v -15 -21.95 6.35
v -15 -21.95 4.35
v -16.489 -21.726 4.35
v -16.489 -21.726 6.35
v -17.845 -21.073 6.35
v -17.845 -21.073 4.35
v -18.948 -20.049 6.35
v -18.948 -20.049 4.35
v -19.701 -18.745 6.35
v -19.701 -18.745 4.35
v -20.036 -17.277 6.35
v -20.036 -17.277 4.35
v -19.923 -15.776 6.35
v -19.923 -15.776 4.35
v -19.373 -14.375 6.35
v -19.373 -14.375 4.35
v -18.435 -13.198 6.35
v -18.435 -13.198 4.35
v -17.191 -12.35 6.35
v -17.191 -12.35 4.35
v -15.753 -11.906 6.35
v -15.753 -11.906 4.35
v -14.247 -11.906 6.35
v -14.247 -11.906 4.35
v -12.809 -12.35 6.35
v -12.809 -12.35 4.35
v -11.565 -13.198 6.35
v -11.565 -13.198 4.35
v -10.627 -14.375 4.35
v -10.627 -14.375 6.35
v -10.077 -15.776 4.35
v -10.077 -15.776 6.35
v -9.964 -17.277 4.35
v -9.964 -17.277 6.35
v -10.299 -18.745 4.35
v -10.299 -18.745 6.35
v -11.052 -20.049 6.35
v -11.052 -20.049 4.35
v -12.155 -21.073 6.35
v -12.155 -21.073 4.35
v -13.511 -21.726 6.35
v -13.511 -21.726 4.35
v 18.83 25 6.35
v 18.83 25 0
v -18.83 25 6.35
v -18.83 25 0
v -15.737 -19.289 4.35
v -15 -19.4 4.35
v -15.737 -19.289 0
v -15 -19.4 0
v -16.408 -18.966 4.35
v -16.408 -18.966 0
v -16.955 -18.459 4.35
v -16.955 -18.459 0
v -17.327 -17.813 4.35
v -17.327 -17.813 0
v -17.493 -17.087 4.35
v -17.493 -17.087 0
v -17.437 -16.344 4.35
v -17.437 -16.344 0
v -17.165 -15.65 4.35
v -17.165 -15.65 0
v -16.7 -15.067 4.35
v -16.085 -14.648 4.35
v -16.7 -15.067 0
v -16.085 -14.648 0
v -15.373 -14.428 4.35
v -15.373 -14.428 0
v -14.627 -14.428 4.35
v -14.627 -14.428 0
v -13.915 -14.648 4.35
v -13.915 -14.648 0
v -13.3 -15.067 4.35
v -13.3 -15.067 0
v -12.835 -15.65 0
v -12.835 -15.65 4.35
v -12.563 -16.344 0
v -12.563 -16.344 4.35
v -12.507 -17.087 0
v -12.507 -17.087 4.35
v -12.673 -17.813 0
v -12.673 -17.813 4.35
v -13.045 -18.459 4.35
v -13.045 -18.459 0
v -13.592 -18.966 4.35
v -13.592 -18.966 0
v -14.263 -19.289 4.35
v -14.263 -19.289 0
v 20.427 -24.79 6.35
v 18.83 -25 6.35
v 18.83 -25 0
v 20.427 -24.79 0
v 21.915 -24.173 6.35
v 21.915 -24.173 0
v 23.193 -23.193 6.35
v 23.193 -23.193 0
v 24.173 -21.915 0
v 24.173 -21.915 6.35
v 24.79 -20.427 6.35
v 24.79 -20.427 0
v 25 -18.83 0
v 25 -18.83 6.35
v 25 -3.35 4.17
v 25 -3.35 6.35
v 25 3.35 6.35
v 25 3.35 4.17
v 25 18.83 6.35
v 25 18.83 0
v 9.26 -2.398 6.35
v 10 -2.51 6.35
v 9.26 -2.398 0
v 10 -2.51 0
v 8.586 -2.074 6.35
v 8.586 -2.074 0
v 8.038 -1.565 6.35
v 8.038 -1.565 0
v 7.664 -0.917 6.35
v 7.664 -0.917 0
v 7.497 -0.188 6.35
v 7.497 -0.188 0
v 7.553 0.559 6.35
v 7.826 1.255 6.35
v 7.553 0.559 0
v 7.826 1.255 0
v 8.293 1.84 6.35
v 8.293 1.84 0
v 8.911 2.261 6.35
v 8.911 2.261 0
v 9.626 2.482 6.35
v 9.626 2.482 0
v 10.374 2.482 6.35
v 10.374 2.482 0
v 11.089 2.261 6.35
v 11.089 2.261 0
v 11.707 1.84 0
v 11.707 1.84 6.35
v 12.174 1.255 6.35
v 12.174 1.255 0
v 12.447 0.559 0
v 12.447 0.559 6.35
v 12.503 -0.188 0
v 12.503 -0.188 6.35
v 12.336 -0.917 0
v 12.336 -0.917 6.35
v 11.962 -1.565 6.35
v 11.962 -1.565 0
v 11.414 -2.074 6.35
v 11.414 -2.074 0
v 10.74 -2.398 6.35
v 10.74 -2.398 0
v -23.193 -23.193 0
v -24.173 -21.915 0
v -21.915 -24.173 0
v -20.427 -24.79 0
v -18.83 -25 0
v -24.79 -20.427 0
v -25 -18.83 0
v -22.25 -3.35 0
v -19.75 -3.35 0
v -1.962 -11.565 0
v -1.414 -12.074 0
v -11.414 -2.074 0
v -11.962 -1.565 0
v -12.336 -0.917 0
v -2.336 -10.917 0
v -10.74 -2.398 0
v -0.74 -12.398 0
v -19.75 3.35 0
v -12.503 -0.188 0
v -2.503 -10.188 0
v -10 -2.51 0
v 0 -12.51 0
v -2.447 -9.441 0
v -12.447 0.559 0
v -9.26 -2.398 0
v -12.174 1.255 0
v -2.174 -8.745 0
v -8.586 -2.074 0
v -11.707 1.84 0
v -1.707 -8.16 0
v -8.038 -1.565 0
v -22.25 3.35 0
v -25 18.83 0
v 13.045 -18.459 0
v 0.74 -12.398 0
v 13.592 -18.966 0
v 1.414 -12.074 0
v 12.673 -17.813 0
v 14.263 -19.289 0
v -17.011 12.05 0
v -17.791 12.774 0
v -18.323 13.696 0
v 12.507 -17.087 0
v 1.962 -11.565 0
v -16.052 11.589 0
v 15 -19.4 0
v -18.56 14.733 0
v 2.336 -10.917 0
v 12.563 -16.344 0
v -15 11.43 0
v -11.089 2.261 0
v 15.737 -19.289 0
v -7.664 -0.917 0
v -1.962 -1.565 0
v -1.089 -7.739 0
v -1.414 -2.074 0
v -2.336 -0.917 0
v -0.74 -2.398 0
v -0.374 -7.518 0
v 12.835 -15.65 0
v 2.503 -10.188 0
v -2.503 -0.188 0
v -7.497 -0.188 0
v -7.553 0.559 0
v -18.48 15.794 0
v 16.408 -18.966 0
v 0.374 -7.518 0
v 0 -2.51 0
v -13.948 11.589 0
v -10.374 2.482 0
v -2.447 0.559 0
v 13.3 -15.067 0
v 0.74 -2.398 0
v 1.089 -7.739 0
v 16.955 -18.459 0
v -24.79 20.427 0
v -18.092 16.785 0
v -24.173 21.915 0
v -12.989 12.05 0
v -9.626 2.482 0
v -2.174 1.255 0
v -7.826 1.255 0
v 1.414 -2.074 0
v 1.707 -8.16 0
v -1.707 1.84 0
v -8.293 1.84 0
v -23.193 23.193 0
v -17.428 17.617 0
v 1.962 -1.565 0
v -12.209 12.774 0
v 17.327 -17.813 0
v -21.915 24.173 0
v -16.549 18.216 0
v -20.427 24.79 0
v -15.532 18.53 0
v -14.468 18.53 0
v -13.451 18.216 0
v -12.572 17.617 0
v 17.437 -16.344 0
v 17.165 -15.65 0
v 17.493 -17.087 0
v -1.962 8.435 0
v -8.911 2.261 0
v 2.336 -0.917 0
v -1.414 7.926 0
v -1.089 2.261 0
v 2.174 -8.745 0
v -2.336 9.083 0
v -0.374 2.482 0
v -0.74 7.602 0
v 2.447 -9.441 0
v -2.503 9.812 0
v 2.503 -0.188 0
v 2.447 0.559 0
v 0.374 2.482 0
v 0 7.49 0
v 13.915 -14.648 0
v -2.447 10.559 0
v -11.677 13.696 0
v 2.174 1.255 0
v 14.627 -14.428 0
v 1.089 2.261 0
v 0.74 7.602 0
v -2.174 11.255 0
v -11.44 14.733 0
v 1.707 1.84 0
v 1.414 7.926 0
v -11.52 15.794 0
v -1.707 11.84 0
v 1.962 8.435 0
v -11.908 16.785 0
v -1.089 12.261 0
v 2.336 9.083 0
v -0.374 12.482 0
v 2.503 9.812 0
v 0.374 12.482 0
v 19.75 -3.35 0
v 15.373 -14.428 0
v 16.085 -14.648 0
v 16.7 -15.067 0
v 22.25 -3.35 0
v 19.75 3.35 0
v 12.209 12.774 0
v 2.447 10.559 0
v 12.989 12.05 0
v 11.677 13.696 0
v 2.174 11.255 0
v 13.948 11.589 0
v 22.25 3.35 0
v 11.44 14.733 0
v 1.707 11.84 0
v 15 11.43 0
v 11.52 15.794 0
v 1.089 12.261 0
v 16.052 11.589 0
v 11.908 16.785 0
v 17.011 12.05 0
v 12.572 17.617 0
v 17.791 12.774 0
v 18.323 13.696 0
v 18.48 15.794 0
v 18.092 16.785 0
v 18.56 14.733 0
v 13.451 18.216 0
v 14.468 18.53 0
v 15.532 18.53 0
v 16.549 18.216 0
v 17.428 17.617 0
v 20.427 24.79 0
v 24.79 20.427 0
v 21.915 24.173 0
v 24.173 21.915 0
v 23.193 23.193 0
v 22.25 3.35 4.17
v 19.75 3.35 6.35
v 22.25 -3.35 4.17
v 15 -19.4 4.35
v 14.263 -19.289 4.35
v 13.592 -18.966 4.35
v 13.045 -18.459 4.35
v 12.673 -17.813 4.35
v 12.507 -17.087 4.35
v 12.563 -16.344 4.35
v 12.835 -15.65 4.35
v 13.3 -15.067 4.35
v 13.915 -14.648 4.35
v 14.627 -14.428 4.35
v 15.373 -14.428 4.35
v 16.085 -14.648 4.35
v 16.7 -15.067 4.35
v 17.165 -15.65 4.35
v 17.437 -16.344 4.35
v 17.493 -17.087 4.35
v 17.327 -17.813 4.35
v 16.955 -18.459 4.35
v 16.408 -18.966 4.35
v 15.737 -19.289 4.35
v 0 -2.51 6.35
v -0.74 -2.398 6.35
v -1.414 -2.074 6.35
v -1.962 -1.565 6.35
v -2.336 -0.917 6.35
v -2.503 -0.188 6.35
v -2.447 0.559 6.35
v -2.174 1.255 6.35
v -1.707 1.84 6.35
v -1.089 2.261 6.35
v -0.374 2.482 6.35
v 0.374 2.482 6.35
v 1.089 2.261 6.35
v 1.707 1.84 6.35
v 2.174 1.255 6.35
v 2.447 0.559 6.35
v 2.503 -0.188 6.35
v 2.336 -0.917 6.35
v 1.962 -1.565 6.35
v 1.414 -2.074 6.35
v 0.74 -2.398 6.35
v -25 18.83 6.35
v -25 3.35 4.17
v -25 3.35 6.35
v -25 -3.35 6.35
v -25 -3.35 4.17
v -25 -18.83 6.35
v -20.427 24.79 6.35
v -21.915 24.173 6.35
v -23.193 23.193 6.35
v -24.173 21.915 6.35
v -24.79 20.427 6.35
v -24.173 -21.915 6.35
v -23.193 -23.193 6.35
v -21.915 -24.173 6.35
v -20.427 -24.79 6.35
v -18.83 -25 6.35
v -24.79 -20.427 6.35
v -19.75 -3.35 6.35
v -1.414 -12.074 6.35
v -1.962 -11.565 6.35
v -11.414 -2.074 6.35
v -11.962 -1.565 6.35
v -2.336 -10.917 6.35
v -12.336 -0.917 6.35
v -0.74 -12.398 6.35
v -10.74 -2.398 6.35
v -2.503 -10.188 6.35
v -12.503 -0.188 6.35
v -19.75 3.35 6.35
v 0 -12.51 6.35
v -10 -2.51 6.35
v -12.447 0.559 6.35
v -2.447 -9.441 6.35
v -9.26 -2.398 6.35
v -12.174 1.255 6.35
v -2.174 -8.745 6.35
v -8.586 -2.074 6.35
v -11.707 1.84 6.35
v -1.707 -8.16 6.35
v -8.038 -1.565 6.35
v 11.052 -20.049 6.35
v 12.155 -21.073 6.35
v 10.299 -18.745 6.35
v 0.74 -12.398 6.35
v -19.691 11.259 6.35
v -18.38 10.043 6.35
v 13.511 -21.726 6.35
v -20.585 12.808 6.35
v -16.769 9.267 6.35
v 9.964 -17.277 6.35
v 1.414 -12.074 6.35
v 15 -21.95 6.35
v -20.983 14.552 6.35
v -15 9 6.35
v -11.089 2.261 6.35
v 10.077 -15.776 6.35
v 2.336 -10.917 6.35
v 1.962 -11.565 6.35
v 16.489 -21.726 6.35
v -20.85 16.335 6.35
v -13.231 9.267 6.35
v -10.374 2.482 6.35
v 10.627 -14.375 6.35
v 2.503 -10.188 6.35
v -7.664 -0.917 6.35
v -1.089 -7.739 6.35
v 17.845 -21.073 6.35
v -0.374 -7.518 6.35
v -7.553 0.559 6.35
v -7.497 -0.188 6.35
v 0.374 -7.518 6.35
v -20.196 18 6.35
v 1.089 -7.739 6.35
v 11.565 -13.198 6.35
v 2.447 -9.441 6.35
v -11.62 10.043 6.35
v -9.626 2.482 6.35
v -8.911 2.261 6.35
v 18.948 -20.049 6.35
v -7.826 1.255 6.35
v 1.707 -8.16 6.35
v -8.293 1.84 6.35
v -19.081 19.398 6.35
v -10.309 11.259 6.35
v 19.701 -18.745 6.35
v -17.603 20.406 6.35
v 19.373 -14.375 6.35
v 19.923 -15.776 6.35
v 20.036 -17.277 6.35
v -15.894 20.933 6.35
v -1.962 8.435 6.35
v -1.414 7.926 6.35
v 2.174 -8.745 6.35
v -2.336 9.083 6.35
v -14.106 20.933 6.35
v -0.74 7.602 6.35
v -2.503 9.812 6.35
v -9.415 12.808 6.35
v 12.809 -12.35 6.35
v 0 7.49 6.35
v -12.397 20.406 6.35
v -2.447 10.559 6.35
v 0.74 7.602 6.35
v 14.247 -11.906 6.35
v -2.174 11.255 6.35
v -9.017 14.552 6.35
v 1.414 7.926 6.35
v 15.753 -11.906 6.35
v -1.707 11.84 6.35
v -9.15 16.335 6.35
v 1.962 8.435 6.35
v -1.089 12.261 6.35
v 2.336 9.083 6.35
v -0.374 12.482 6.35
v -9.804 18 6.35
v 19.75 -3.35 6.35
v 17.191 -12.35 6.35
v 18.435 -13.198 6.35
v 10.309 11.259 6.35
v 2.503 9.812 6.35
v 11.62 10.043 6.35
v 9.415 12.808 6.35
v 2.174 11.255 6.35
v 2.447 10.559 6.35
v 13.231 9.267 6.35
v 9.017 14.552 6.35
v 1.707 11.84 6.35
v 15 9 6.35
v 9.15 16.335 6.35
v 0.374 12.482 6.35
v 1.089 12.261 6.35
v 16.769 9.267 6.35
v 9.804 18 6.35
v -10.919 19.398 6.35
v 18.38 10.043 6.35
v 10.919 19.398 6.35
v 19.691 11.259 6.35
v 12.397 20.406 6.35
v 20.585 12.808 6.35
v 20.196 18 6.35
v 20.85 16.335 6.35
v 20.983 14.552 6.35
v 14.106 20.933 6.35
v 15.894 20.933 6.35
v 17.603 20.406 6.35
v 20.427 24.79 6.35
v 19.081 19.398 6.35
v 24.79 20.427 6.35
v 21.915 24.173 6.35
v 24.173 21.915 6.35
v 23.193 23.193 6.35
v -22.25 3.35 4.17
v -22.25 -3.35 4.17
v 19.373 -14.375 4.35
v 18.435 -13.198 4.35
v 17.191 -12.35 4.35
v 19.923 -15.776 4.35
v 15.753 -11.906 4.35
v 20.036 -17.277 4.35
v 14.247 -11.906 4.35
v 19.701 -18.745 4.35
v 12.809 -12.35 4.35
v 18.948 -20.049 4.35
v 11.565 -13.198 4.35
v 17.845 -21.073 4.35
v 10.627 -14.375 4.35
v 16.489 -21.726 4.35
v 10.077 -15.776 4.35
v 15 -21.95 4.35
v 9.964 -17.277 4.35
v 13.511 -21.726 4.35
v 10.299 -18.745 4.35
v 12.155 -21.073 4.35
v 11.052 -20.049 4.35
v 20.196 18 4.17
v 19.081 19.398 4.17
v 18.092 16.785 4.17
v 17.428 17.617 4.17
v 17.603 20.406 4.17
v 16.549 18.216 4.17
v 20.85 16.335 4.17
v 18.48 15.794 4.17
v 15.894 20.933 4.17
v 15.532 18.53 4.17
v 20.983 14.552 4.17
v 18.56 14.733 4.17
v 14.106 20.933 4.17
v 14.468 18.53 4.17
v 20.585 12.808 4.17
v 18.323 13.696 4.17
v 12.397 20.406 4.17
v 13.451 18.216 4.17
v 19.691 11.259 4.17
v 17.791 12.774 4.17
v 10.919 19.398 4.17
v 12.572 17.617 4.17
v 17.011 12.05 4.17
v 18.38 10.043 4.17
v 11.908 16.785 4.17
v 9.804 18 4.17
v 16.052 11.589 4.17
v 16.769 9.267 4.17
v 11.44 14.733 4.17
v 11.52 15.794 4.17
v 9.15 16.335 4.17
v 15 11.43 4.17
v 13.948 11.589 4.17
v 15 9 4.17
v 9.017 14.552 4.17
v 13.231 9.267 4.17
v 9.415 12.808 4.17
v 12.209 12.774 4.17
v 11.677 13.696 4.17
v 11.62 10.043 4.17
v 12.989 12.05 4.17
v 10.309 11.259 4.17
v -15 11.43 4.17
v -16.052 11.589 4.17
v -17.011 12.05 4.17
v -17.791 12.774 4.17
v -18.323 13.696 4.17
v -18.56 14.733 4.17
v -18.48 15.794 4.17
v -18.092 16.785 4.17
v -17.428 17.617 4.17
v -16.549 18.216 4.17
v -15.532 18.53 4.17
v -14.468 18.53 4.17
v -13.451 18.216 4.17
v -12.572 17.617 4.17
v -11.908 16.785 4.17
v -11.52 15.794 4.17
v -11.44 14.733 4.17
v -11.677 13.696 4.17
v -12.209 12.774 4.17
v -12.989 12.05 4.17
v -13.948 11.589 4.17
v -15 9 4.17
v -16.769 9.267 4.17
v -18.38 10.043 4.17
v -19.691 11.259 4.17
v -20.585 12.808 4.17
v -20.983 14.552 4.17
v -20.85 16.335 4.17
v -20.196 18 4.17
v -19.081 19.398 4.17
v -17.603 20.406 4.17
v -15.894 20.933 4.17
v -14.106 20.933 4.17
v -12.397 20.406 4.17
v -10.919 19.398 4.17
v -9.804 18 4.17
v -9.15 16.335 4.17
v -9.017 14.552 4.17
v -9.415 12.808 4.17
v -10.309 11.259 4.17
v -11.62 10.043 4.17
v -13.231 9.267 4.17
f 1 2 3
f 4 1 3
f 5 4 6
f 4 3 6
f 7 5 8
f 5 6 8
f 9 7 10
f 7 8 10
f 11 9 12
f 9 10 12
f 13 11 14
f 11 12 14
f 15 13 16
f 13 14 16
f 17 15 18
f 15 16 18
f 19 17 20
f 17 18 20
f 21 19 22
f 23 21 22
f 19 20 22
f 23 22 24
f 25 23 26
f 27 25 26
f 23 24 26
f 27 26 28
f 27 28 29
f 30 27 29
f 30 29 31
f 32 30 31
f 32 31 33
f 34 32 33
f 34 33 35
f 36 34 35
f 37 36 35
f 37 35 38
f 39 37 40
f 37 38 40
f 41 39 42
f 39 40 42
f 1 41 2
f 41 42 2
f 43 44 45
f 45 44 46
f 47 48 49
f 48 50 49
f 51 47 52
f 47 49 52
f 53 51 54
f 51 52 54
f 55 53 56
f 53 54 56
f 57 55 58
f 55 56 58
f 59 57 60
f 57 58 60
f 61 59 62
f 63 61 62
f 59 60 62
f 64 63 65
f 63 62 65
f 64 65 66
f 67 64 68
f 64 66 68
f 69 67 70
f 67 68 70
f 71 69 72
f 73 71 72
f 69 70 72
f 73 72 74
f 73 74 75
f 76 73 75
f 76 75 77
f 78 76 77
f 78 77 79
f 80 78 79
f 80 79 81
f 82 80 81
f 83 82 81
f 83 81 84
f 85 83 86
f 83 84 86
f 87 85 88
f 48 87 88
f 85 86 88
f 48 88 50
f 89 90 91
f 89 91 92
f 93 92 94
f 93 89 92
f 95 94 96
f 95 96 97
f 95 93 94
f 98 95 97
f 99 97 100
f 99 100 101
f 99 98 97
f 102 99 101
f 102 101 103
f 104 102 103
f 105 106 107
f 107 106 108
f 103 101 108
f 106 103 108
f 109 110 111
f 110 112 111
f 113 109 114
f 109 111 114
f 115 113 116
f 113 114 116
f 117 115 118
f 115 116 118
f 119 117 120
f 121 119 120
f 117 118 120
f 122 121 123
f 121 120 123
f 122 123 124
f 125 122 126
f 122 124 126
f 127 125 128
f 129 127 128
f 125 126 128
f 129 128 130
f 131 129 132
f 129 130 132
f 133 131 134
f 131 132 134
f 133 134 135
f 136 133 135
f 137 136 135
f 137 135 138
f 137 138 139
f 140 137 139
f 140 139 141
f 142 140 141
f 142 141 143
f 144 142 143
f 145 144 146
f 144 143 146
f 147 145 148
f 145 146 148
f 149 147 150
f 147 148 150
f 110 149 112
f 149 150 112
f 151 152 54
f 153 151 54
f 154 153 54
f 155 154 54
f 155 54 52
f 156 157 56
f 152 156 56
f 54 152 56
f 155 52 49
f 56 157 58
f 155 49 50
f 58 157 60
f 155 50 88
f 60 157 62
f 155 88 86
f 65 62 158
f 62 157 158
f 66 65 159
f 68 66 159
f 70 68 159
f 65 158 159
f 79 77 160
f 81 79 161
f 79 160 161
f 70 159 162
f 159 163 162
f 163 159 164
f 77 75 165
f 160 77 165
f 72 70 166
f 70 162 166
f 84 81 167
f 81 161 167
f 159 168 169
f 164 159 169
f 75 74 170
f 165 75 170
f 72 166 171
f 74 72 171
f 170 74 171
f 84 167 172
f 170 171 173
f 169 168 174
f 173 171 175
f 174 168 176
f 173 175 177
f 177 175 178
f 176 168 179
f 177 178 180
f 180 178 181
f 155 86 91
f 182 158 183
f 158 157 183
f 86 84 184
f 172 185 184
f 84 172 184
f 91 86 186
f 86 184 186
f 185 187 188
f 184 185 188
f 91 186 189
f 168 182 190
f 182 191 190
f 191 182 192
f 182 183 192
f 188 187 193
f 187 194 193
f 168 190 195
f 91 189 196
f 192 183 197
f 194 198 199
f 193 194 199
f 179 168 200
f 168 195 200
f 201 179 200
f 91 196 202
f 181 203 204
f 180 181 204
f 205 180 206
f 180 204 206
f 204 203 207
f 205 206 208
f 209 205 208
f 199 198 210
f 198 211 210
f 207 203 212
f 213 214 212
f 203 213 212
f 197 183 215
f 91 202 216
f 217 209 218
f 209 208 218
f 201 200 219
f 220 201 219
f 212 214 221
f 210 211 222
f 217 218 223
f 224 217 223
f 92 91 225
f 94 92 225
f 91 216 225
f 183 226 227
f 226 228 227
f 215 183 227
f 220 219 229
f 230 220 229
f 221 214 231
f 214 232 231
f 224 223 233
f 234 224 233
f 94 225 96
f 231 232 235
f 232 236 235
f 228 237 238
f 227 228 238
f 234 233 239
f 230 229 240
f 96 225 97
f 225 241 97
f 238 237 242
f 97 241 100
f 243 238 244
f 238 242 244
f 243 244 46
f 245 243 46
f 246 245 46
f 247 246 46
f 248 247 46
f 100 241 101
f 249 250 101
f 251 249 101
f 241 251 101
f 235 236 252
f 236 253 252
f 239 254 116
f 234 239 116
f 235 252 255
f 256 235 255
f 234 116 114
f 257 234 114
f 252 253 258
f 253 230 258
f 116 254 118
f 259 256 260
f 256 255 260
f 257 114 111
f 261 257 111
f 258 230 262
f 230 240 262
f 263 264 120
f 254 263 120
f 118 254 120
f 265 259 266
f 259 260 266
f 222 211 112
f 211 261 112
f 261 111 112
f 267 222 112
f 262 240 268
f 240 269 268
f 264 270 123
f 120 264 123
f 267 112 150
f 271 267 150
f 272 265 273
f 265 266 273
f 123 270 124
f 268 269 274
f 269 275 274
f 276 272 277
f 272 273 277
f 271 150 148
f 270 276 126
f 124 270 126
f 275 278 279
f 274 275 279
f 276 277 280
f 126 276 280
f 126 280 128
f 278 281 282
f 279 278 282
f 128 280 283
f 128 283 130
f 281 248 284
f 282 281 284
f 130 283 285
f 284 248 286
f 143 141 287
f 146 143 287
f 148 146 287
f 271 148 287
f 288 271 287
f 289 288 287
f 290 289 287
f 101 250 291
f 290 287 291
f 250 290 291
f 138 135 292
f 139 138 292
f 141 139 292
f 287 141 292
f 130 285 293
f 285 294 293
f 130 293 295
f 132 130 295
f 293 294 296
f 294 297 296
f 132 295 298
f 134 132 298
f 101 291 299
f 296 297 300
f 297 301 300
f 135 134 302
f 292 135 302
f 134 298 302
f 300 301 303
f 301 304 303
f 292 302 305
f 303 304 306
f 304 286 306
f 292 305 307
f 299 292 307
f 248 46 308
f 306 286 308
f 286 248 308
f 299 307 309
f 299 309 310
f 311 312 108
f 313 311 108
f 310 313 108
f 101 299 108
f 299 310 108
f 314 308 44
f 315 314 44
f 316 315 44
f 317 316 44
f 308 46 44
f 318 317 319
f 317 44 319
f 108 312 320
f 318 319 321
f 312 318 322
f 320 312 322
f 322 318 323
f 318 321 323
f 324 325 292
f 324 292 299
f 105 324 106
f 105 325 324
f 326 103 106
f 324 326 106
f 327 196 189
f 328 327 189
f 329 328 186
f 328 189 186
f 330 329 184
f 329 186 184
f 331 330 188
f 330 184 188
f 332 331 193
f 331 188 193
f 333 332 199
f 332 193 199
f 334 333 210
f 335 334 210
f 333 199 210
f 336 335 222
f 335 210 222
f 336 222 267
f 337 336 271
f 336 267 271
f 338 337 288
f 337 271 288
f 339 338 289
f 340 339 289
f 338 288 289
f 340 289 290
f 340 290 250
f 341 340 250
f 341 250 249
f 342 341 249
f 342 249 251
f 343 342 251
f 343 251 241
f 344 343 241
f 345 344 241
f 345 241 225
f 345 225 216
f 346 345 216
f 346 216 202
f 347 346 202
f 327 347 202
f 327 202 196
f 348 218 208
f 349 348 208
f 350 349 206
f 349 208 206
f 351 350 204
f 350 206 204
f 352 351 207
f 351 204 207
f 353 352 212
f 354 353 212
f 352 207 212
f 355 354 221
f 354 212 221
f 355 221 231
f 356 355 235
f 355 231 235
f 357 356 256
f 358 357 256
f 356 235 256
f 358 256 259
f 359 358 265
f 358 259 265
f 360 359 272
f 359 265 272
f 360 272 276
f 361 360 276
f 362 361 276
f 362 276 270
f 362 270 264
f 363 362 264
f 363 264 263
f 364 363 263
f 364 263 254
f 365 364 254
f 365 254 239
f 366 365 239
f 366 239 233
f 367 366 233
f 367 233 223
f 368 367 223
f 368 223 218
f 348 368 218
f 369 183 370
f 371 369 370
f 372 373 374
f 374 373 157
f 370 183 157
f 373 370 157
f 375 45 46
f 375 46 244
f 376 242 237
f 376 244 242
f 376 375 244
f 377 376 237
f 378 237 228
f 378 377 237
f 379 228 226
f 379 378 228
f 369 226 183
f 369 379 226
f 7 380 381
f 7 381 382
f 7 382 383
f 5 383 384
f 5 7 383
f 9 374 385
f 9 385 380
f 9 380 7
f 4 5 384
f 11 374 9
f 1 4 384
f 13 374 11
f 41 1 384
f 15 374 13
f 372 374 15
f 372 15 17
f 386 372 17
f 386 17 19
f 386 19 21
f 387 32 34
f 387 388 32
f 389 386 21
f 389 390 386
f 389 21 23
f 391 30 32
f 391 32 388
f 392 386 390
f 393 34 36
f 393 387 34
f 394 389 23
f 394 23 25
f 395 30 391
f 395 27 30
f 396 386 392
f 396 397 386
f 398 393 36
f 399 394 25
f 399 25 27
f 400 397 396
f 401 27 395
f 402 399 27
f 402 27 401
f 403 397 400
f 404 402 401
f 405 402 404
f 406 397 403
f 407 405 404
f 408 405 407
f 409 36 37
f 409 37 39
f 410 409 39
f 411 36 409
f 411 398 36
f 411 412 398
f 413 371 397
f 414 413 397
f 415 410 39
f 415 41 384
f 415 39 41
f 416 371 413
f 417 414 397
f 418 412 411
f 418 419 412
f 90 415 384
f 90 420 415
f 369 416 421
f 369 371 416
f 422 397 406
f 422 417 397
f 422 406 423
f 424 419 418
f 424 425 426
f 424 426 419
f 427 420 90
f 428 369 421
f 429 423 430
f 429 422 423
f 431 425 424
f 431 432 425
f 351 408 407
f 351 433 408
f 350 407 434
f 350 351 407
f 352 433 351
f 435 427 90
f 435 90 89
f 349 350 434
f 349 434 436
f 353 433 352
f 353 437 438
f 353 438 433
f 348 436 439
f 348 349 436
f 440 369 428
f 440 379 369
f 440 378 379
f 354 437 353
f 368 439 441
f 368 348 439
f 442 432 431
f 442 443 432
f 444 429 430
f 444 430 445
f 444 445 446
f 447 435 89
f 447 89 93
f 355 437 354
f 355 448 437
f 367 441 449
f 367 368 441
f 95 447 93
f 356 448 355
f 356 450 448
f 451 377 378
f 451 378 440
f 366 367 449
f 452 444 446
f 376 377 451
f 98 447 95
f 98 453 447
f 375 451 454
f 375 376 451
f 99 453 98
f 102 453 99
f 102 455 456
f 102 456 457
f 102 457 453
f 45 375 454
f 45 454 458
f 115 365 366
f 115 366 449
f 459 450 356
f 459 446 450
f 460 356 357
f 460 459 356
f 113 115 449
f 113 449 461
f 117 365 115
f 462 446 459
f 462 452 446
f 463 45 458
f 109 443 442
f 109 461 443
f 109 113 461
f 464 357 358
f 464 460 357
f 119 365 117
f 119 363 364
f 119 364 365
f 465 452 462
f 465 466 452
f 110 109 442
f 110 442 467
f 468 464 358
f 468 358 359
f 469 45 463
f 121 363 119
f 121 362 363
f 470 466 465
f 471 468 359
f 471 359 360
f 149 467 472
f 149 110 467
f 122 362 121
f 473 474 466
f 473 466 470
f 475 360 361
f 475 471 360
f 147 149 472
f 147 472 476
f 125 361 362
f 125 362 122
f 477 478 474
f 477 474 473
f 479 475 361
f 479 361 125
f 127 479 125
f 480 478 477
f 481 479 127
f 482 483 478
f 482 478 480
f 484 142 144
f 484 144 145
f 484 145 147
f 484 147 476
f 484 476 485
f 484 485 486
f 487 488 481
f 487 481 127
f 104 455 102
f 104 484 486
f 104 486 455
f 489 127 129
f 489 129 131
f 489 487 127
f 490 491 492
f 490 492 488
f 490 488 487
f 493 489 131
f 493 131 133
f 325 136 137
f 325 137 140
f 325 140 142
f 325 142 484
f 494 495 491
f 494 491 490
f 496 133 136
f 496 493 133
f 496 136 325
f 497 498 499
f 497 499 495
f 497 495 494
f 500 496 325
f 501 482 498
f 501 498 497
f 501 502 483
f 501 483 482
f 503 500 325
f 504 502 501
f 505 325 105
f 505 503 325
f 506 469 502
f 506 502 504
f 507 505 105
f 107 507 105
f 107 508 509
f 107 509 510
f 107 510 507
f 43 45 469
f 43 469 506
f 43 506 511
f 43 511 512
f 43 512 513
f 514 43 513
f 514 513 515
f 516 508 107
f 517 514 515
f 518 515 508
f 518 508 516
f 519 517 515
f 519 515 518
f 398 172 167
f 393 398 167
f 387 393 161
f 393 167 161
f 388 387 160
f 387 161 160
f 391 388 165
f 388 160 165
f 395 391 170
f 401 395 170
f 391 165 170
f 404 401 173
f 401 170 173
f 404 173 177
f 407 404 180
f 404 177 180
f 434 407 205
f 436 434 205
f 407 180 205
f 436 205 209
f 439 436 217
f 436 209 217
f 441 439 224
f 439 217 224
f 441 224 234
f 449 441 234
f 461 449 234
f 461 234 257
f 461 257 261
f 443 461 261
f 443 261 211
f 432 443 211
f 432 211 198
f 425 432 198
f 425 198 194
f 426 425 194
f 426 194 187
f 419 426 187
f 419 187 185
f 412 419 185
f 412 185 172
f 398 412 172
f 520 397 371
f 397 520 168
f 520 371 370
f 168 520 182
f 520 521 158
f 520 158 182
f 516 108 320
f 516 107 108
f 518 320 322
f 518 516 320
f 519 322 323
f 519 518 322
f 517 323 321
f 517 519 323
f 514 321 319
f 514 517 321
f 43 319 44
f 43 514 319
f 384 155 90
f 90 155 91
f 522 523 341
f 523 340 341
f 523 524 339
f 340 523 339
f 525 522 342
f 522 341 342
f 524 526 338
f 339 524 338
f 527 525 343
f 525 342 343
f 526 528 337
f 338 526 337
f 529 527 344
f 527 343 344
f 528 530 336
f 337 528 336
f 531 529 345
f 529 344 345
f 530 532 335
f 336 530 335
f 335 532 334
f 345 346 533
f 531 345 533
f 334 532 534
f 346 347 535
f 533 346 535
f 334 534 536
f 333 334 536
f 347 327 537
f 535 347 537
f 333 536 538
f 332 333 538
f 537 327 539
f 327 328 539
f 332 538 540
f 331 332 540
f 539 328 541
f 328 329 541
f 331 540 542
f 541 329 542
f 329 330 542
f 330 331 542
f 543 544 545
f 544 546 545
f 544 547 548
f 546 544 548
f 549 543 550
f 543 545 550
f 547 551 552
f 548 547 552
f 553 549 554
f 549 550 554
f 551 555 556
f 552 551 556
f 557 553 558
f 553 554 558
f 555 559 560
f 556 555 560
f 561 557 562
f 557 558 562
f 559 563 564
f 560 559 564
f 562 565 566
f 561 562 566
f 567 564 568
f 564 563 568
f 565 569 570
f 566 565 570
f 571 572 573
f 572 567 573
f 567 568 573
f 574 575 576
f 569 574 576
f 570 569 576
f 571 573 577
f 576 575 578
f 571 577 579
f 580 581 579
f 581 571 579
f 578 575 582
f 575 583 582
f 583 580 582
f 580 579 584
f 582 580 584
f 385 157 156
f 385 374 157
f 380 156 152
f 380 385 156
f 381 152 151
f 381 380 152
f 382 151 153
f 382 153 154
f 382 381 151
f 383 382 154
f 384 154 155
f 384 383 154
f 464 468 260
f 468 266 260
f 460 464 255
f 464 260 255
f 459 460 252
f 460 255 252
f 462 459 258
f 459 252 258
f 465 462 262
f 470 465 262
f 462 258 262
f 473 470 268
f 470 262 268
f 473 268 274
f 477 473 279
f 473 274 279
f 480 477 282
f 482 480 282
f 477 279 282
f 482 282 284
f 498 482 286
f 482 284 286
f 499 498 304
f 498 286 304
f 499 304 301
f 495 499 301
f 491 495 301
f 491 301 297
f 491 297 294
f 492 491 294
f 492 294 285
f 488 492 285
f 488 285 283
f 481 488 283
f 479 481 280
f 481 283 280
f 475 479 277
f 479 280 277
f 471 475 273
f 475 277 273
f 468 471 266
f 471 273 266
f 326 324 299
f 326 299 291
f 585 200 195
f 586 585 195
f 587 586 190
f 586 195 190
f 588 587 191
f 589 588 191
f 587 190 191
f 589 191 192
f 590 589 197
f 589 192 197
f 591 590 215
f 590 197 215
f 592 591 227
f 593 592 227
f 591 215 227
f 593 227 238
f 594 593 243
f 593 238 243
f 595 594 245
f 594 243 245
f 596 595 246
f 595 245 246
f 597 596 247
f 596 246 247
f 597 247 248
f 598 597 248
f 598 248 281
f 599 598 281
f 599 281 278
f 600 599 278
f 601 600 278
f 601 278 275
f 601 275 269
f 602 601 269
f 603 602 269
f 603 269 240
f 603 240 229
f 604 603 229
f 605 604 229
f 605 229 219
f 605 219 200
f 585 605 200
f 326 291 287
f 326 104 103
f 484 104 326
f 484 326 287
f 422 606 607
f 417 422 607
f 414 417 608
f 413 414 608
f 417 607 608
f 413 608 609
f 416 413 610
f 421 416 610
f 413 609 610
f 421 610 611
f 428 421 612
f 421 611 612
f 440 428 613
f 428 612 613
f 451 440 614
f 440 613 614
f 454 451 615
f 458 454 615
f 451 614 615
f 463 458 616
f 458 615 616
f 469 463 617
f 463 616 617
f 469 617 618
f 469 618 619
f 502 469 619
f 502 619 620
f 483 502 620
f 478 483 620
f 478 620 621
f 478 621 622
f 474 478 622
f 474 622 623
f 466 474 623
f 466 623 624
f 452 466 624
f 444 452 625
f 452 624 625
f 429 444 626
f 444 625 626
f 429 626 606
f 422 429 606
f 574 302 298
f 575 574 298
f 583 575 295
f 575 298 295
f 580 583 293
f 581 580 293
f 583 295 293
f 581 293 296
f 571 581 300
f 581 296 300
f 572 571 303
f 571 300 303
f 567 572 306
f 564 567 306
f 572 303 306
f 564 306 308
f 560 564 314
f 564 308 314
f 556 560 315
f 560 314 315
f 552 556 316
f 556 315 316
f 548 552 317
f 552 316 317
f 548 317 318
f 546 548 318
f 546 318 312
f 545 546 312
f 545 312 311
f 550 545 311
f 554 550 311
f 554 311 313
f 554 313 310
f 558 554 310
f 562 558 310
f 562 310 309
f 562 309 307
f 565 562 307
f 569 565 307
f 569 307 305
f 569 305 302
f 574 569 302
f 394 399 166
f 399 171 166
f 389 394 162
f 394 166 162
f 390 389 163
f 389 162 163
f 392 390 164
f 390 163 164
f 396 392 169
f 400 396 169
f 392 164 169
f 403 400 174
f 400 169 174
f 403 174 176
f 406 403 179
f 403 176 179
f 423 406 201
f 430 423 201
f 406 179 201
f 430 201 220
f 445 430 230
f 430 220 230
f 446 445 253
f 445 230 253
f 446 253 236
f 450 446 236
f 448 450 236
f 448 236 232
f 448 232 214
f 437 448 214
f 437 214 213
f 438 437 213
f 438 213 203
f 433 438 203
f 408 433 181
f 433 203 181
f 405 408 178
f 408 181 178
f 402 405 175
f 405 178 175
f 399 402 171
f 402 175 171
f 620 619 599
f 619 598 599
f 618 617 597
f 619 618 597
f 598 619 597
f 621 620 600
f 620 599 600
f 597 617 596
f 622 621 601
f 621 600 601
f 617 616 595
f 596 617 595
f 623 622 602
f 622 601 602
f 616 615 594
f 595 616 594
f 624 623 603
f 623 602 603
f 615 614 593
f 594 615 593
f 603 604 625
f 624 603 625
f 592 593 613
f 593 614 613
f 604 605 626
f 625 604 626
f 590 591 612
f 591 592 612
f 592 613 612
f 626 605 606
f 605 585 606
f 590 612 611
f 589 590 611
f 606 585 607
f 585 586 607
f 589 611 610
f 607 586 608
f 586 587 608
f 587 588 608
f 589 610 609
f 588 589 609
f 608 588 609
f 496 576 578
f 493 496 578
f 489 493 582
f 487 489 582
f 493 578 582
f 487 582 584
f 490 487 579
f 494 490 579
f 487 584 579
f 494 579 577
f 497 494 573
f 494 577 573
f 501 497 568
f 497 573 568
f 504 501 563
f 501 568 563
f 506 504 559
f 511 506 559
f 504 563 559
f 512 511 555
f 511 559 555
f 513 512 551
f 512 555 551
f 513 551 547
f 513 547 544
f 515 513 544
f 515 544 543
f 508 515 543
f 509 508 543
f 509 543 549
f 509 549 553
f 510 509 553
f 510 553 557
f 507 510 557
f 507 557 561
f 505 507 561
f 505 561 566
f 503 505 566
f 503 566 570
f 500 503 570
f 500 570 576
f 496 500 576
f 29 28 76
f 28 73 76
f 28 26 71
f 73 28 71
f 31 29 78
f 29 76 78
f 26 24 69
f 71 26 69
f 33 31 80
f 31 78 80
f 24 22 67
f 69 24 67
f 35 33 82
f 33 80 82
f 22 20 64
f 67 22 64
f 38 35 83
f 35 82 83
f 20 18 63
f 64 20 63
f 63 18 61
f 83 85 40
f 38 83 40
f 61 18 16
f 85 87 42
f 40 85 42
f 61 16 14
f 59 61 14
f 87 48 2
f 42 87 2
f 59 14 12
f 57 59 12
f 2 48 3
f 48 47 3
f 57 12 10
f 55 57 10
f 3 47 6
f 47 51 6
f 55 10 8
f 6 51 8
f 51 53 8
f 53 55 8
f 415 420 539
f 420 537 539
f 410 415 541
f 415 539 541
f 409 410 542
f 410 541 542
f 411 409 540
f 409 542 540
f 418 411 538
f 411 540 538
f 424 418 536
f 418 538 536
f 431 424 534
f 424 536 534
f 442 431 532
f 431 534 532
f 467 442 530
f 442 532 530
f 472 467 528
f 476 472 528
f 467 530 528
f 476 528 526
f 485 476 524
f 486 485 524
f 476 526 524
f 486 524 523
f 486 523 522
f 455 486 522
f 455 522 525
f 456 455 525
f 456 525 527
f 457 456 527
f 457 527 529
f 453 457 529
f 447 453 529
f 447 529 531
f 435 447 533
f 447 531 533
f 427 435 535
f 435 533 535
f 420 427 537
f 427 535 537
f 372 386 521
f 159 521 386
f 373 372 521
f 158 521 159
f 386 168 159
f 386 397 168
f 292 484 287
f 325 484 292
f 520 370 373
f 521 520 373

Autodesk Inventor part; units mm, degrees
ref_plane "YZ Plane" through (0, 0, 0) normal (1, 0, 0) x (0, 1, 0)
ref_plane "XZ Plane" through (0, 0, 0) normal (0, 1, 0) x (-1, 0, 0)
sketch "Sketch1" plane through (0, 0, 0) normal (0, 0, 1) x (1, 0, 0)
  line L0 (-25, -25) -> (25, -25)
  line L1 (25, -25) -> (25, 25)
  line L2 (25, 25) -> (-25, 25)
  line L3 (-25, 25) -> (-25, -25)
  line L4 (-25, -25) -> (25, 25) construction
  line L5 (25, -25) -> (-25, 25) construction
  point P0 (0, 0)
  dimension "Width" = 50
  dimension "Height" = 50
extrude "Extrusion1" add sketch "Sketch1" along normal blind 6.35
sketch "Sketch2" plane through (0, 0, 6.35) normal (0, 0, 1) x (1, 0, 0)
  line L0 (-25, -25) -> (25, -25) projected
  line L1 (25, -25) -> (25, 25) projected
  line L2 (25, 25) -> (-25, 25) projected
  line L3 (-25, 25) -> (-25, -25) projected
  line L4 (0, 25) -> (0, -25) construction
  line L5 (-25, 0) -> (25, 0) construction
  point P0 (0, 0)
  point P1 (0, 0)
  point P2 (-10, 0)
  point P3 (0, 10)
  point P4 (0, -10)
  point P5 (10, 0)
  dimension "d4" = 10
  dimension "d5" = 10
  dimension "d6" = 10
  dimension "d7" = 10
hole "Hole1" at (0, 0, 6.35) at (-10, 0, 6.35) at (0, 10, 6.35) at (0, -10, 6.35) at (10, 0, 6.35) direction (0, 0, -1) diameter 5.02 end through all
sketch "Sketch3" plane through (0, 0, 6.35) normal (0, 0, 1) x (1, 0, 0)
  line L0 (-25, -25) -> (25, -25) projected
  line L1 (25, -25) -> (25, 25) projected
  line L2 (25, 25) -> (-25, 25) projected
  line L3 (-25, 25) -> (-25, -25) projected
  line L4 (0, 25) -> (0, -25) construction
  line L5 (25, 0) -> (-25, 0) construction
  line L6 (15, 25) -> (15, -25) construction
  line L7 (-25, -15) -> (25, -15) construction
  point P0 (15, 15)
  point P1 (-15, 15)
  dimension "d15" = 15
  dimension "d16" = 15
hole "Hole2" at (-15, 15, 6.35) at (15, 15, 6.35) direction (0, 0, -1) diameter 7.14 end through all counterbore diameter 12 counterbore depth 2.18
sketch "Sketch6" plane through (0, 0, 6.35) normal (0, 0, 1) x (1, 0, 0)
  circle A0 centre (-15, 15) radius 6 projected
  circle A1 centre (15, 15) radius 6 projected
  circle A2 centre (0, -10) radius 2.51 projected
  circle A3 centre (-10, 0) radius 2.51 projected
  circle A4 centre (0, 0) radius 2.51 projected
  circle A5 centre (0, 10) radius 2.51 projected
  circle A6 centre (10, 0) radius 2.51 projected
  line L0 (-25, -25) -> (25, -25) projected
  line L1 (25, -25) -> (25, 25) projected
  line L2 (25, 25) -> (-25, 25) projected
  line L3 (-25, 25) -> (-25, -25) projected
sketch "Sketch7" plane through (0, 0, 6.35) normal (0, 0, 1) x (1, 0, 0)
  circle A0 centre (-15, 15) radius 6 projected
  circle A1 centre (15, 15) radius 6 projected
  line L0 (-25, -25) -> (25, -25) projected
  line L1 (25, -25) -> (25, 25) projected
  line L2 (-25, 25) -> (-25, -25) projected
  line L3 (15, 15) -> (15, -25) construction
  line L4 (25, -16.9) -> (-25, -16.9) construction
  line L5 (-15, 15) -> (-15, -16.9) construction
  point P0 (15, -16.9)
  dimension "d35" = 31.9
hole "Hole3" at (-15, -16.9, 6.35) at (15, -16.9, 6.35) direction (0, 0, -1) diameter 5 end through all counterbore diameter 10.1 counterbore depth 2
fillet "Fillet1" radius 6.17 4 edges at (25, 25, 3.175) (25, -25, 3.175) (-25, 25, 3.175) (-25, -25, 3.175)
sketch "Sketch4" plane through (0, 0, 6.35) normal (0, 0, 1) x (1, 0, 0)
  line L0 (25, -18.83) -> (25, 18.83) projected
  line L1 (-25, 18.83) -> (-25, -18.83) projected
  line L2 (-25, 0) -> (25, 0) construction
  line L3 (-22.25, 3.35) -> (-19.75, 3.35)
  line L4 (-19.75, 3.35) -> (-19.75, -3.35)
  line L5 (-19.75, -3.35) -> (-22.25, -3.35)
  line L6 (-22.25, -3.35) -> (-22.25, 3.35)
  line L7 (-22.25, 3.35) -> (-19.75, -3.35) construction
  line L8 (-19.75, 3.35) -> (-22.25, -3.35) construction
  point P0 (-21, 0)
  dimension "d25" = 2.5
  dimension "d27" = 5.25
  dimension "d28" = 6.7
extrude "Extrusion2" cut sketch "Sketch4" against normal through all
sketch "Sketch5" plane through (-25, -18.83, 0) normal (-1, 0, 0) x (0, 0, 1)
  line L0 (6.35, 37.66) -> (6.35, 0) projected
  line L1 (0, 15.48) -> (0, 22.18) projected
  line L2 (6.35, 22.18) -> (0, 22.18) projected
  line L3 (6.35, 15.48) -> (0, 15.48) projected
  line L4 (6.35, 22.18) -> (4.17, 22.18)
  line L5 (4.17, 22.18) -> (4.17, 15.48)
  line L6 (4.17, 15.48) -> (6.35, 15.48)
  line L7 (6.35, 15.48) -> (6.35, 22.18)
  point P0 (0, 18.83)
  dimension "d31" = 2.18
extrude "Extrusion3" cut sketch "Sketch5" against normal up to surface (5.25 mm away) contours L0 L3 L5 L2
ref_plane "Work Plane1" through (0, -18.83, 0) normal (-1, 0, 0) x (0, 0, 1)
mirror "Mirror1" about plane through (0, -18.83, 0) normal (-1, 0, 0) of "Extrusion2", "Extrusion3"
properties part number "Micro V Plate" material "Aluminum 6061"
